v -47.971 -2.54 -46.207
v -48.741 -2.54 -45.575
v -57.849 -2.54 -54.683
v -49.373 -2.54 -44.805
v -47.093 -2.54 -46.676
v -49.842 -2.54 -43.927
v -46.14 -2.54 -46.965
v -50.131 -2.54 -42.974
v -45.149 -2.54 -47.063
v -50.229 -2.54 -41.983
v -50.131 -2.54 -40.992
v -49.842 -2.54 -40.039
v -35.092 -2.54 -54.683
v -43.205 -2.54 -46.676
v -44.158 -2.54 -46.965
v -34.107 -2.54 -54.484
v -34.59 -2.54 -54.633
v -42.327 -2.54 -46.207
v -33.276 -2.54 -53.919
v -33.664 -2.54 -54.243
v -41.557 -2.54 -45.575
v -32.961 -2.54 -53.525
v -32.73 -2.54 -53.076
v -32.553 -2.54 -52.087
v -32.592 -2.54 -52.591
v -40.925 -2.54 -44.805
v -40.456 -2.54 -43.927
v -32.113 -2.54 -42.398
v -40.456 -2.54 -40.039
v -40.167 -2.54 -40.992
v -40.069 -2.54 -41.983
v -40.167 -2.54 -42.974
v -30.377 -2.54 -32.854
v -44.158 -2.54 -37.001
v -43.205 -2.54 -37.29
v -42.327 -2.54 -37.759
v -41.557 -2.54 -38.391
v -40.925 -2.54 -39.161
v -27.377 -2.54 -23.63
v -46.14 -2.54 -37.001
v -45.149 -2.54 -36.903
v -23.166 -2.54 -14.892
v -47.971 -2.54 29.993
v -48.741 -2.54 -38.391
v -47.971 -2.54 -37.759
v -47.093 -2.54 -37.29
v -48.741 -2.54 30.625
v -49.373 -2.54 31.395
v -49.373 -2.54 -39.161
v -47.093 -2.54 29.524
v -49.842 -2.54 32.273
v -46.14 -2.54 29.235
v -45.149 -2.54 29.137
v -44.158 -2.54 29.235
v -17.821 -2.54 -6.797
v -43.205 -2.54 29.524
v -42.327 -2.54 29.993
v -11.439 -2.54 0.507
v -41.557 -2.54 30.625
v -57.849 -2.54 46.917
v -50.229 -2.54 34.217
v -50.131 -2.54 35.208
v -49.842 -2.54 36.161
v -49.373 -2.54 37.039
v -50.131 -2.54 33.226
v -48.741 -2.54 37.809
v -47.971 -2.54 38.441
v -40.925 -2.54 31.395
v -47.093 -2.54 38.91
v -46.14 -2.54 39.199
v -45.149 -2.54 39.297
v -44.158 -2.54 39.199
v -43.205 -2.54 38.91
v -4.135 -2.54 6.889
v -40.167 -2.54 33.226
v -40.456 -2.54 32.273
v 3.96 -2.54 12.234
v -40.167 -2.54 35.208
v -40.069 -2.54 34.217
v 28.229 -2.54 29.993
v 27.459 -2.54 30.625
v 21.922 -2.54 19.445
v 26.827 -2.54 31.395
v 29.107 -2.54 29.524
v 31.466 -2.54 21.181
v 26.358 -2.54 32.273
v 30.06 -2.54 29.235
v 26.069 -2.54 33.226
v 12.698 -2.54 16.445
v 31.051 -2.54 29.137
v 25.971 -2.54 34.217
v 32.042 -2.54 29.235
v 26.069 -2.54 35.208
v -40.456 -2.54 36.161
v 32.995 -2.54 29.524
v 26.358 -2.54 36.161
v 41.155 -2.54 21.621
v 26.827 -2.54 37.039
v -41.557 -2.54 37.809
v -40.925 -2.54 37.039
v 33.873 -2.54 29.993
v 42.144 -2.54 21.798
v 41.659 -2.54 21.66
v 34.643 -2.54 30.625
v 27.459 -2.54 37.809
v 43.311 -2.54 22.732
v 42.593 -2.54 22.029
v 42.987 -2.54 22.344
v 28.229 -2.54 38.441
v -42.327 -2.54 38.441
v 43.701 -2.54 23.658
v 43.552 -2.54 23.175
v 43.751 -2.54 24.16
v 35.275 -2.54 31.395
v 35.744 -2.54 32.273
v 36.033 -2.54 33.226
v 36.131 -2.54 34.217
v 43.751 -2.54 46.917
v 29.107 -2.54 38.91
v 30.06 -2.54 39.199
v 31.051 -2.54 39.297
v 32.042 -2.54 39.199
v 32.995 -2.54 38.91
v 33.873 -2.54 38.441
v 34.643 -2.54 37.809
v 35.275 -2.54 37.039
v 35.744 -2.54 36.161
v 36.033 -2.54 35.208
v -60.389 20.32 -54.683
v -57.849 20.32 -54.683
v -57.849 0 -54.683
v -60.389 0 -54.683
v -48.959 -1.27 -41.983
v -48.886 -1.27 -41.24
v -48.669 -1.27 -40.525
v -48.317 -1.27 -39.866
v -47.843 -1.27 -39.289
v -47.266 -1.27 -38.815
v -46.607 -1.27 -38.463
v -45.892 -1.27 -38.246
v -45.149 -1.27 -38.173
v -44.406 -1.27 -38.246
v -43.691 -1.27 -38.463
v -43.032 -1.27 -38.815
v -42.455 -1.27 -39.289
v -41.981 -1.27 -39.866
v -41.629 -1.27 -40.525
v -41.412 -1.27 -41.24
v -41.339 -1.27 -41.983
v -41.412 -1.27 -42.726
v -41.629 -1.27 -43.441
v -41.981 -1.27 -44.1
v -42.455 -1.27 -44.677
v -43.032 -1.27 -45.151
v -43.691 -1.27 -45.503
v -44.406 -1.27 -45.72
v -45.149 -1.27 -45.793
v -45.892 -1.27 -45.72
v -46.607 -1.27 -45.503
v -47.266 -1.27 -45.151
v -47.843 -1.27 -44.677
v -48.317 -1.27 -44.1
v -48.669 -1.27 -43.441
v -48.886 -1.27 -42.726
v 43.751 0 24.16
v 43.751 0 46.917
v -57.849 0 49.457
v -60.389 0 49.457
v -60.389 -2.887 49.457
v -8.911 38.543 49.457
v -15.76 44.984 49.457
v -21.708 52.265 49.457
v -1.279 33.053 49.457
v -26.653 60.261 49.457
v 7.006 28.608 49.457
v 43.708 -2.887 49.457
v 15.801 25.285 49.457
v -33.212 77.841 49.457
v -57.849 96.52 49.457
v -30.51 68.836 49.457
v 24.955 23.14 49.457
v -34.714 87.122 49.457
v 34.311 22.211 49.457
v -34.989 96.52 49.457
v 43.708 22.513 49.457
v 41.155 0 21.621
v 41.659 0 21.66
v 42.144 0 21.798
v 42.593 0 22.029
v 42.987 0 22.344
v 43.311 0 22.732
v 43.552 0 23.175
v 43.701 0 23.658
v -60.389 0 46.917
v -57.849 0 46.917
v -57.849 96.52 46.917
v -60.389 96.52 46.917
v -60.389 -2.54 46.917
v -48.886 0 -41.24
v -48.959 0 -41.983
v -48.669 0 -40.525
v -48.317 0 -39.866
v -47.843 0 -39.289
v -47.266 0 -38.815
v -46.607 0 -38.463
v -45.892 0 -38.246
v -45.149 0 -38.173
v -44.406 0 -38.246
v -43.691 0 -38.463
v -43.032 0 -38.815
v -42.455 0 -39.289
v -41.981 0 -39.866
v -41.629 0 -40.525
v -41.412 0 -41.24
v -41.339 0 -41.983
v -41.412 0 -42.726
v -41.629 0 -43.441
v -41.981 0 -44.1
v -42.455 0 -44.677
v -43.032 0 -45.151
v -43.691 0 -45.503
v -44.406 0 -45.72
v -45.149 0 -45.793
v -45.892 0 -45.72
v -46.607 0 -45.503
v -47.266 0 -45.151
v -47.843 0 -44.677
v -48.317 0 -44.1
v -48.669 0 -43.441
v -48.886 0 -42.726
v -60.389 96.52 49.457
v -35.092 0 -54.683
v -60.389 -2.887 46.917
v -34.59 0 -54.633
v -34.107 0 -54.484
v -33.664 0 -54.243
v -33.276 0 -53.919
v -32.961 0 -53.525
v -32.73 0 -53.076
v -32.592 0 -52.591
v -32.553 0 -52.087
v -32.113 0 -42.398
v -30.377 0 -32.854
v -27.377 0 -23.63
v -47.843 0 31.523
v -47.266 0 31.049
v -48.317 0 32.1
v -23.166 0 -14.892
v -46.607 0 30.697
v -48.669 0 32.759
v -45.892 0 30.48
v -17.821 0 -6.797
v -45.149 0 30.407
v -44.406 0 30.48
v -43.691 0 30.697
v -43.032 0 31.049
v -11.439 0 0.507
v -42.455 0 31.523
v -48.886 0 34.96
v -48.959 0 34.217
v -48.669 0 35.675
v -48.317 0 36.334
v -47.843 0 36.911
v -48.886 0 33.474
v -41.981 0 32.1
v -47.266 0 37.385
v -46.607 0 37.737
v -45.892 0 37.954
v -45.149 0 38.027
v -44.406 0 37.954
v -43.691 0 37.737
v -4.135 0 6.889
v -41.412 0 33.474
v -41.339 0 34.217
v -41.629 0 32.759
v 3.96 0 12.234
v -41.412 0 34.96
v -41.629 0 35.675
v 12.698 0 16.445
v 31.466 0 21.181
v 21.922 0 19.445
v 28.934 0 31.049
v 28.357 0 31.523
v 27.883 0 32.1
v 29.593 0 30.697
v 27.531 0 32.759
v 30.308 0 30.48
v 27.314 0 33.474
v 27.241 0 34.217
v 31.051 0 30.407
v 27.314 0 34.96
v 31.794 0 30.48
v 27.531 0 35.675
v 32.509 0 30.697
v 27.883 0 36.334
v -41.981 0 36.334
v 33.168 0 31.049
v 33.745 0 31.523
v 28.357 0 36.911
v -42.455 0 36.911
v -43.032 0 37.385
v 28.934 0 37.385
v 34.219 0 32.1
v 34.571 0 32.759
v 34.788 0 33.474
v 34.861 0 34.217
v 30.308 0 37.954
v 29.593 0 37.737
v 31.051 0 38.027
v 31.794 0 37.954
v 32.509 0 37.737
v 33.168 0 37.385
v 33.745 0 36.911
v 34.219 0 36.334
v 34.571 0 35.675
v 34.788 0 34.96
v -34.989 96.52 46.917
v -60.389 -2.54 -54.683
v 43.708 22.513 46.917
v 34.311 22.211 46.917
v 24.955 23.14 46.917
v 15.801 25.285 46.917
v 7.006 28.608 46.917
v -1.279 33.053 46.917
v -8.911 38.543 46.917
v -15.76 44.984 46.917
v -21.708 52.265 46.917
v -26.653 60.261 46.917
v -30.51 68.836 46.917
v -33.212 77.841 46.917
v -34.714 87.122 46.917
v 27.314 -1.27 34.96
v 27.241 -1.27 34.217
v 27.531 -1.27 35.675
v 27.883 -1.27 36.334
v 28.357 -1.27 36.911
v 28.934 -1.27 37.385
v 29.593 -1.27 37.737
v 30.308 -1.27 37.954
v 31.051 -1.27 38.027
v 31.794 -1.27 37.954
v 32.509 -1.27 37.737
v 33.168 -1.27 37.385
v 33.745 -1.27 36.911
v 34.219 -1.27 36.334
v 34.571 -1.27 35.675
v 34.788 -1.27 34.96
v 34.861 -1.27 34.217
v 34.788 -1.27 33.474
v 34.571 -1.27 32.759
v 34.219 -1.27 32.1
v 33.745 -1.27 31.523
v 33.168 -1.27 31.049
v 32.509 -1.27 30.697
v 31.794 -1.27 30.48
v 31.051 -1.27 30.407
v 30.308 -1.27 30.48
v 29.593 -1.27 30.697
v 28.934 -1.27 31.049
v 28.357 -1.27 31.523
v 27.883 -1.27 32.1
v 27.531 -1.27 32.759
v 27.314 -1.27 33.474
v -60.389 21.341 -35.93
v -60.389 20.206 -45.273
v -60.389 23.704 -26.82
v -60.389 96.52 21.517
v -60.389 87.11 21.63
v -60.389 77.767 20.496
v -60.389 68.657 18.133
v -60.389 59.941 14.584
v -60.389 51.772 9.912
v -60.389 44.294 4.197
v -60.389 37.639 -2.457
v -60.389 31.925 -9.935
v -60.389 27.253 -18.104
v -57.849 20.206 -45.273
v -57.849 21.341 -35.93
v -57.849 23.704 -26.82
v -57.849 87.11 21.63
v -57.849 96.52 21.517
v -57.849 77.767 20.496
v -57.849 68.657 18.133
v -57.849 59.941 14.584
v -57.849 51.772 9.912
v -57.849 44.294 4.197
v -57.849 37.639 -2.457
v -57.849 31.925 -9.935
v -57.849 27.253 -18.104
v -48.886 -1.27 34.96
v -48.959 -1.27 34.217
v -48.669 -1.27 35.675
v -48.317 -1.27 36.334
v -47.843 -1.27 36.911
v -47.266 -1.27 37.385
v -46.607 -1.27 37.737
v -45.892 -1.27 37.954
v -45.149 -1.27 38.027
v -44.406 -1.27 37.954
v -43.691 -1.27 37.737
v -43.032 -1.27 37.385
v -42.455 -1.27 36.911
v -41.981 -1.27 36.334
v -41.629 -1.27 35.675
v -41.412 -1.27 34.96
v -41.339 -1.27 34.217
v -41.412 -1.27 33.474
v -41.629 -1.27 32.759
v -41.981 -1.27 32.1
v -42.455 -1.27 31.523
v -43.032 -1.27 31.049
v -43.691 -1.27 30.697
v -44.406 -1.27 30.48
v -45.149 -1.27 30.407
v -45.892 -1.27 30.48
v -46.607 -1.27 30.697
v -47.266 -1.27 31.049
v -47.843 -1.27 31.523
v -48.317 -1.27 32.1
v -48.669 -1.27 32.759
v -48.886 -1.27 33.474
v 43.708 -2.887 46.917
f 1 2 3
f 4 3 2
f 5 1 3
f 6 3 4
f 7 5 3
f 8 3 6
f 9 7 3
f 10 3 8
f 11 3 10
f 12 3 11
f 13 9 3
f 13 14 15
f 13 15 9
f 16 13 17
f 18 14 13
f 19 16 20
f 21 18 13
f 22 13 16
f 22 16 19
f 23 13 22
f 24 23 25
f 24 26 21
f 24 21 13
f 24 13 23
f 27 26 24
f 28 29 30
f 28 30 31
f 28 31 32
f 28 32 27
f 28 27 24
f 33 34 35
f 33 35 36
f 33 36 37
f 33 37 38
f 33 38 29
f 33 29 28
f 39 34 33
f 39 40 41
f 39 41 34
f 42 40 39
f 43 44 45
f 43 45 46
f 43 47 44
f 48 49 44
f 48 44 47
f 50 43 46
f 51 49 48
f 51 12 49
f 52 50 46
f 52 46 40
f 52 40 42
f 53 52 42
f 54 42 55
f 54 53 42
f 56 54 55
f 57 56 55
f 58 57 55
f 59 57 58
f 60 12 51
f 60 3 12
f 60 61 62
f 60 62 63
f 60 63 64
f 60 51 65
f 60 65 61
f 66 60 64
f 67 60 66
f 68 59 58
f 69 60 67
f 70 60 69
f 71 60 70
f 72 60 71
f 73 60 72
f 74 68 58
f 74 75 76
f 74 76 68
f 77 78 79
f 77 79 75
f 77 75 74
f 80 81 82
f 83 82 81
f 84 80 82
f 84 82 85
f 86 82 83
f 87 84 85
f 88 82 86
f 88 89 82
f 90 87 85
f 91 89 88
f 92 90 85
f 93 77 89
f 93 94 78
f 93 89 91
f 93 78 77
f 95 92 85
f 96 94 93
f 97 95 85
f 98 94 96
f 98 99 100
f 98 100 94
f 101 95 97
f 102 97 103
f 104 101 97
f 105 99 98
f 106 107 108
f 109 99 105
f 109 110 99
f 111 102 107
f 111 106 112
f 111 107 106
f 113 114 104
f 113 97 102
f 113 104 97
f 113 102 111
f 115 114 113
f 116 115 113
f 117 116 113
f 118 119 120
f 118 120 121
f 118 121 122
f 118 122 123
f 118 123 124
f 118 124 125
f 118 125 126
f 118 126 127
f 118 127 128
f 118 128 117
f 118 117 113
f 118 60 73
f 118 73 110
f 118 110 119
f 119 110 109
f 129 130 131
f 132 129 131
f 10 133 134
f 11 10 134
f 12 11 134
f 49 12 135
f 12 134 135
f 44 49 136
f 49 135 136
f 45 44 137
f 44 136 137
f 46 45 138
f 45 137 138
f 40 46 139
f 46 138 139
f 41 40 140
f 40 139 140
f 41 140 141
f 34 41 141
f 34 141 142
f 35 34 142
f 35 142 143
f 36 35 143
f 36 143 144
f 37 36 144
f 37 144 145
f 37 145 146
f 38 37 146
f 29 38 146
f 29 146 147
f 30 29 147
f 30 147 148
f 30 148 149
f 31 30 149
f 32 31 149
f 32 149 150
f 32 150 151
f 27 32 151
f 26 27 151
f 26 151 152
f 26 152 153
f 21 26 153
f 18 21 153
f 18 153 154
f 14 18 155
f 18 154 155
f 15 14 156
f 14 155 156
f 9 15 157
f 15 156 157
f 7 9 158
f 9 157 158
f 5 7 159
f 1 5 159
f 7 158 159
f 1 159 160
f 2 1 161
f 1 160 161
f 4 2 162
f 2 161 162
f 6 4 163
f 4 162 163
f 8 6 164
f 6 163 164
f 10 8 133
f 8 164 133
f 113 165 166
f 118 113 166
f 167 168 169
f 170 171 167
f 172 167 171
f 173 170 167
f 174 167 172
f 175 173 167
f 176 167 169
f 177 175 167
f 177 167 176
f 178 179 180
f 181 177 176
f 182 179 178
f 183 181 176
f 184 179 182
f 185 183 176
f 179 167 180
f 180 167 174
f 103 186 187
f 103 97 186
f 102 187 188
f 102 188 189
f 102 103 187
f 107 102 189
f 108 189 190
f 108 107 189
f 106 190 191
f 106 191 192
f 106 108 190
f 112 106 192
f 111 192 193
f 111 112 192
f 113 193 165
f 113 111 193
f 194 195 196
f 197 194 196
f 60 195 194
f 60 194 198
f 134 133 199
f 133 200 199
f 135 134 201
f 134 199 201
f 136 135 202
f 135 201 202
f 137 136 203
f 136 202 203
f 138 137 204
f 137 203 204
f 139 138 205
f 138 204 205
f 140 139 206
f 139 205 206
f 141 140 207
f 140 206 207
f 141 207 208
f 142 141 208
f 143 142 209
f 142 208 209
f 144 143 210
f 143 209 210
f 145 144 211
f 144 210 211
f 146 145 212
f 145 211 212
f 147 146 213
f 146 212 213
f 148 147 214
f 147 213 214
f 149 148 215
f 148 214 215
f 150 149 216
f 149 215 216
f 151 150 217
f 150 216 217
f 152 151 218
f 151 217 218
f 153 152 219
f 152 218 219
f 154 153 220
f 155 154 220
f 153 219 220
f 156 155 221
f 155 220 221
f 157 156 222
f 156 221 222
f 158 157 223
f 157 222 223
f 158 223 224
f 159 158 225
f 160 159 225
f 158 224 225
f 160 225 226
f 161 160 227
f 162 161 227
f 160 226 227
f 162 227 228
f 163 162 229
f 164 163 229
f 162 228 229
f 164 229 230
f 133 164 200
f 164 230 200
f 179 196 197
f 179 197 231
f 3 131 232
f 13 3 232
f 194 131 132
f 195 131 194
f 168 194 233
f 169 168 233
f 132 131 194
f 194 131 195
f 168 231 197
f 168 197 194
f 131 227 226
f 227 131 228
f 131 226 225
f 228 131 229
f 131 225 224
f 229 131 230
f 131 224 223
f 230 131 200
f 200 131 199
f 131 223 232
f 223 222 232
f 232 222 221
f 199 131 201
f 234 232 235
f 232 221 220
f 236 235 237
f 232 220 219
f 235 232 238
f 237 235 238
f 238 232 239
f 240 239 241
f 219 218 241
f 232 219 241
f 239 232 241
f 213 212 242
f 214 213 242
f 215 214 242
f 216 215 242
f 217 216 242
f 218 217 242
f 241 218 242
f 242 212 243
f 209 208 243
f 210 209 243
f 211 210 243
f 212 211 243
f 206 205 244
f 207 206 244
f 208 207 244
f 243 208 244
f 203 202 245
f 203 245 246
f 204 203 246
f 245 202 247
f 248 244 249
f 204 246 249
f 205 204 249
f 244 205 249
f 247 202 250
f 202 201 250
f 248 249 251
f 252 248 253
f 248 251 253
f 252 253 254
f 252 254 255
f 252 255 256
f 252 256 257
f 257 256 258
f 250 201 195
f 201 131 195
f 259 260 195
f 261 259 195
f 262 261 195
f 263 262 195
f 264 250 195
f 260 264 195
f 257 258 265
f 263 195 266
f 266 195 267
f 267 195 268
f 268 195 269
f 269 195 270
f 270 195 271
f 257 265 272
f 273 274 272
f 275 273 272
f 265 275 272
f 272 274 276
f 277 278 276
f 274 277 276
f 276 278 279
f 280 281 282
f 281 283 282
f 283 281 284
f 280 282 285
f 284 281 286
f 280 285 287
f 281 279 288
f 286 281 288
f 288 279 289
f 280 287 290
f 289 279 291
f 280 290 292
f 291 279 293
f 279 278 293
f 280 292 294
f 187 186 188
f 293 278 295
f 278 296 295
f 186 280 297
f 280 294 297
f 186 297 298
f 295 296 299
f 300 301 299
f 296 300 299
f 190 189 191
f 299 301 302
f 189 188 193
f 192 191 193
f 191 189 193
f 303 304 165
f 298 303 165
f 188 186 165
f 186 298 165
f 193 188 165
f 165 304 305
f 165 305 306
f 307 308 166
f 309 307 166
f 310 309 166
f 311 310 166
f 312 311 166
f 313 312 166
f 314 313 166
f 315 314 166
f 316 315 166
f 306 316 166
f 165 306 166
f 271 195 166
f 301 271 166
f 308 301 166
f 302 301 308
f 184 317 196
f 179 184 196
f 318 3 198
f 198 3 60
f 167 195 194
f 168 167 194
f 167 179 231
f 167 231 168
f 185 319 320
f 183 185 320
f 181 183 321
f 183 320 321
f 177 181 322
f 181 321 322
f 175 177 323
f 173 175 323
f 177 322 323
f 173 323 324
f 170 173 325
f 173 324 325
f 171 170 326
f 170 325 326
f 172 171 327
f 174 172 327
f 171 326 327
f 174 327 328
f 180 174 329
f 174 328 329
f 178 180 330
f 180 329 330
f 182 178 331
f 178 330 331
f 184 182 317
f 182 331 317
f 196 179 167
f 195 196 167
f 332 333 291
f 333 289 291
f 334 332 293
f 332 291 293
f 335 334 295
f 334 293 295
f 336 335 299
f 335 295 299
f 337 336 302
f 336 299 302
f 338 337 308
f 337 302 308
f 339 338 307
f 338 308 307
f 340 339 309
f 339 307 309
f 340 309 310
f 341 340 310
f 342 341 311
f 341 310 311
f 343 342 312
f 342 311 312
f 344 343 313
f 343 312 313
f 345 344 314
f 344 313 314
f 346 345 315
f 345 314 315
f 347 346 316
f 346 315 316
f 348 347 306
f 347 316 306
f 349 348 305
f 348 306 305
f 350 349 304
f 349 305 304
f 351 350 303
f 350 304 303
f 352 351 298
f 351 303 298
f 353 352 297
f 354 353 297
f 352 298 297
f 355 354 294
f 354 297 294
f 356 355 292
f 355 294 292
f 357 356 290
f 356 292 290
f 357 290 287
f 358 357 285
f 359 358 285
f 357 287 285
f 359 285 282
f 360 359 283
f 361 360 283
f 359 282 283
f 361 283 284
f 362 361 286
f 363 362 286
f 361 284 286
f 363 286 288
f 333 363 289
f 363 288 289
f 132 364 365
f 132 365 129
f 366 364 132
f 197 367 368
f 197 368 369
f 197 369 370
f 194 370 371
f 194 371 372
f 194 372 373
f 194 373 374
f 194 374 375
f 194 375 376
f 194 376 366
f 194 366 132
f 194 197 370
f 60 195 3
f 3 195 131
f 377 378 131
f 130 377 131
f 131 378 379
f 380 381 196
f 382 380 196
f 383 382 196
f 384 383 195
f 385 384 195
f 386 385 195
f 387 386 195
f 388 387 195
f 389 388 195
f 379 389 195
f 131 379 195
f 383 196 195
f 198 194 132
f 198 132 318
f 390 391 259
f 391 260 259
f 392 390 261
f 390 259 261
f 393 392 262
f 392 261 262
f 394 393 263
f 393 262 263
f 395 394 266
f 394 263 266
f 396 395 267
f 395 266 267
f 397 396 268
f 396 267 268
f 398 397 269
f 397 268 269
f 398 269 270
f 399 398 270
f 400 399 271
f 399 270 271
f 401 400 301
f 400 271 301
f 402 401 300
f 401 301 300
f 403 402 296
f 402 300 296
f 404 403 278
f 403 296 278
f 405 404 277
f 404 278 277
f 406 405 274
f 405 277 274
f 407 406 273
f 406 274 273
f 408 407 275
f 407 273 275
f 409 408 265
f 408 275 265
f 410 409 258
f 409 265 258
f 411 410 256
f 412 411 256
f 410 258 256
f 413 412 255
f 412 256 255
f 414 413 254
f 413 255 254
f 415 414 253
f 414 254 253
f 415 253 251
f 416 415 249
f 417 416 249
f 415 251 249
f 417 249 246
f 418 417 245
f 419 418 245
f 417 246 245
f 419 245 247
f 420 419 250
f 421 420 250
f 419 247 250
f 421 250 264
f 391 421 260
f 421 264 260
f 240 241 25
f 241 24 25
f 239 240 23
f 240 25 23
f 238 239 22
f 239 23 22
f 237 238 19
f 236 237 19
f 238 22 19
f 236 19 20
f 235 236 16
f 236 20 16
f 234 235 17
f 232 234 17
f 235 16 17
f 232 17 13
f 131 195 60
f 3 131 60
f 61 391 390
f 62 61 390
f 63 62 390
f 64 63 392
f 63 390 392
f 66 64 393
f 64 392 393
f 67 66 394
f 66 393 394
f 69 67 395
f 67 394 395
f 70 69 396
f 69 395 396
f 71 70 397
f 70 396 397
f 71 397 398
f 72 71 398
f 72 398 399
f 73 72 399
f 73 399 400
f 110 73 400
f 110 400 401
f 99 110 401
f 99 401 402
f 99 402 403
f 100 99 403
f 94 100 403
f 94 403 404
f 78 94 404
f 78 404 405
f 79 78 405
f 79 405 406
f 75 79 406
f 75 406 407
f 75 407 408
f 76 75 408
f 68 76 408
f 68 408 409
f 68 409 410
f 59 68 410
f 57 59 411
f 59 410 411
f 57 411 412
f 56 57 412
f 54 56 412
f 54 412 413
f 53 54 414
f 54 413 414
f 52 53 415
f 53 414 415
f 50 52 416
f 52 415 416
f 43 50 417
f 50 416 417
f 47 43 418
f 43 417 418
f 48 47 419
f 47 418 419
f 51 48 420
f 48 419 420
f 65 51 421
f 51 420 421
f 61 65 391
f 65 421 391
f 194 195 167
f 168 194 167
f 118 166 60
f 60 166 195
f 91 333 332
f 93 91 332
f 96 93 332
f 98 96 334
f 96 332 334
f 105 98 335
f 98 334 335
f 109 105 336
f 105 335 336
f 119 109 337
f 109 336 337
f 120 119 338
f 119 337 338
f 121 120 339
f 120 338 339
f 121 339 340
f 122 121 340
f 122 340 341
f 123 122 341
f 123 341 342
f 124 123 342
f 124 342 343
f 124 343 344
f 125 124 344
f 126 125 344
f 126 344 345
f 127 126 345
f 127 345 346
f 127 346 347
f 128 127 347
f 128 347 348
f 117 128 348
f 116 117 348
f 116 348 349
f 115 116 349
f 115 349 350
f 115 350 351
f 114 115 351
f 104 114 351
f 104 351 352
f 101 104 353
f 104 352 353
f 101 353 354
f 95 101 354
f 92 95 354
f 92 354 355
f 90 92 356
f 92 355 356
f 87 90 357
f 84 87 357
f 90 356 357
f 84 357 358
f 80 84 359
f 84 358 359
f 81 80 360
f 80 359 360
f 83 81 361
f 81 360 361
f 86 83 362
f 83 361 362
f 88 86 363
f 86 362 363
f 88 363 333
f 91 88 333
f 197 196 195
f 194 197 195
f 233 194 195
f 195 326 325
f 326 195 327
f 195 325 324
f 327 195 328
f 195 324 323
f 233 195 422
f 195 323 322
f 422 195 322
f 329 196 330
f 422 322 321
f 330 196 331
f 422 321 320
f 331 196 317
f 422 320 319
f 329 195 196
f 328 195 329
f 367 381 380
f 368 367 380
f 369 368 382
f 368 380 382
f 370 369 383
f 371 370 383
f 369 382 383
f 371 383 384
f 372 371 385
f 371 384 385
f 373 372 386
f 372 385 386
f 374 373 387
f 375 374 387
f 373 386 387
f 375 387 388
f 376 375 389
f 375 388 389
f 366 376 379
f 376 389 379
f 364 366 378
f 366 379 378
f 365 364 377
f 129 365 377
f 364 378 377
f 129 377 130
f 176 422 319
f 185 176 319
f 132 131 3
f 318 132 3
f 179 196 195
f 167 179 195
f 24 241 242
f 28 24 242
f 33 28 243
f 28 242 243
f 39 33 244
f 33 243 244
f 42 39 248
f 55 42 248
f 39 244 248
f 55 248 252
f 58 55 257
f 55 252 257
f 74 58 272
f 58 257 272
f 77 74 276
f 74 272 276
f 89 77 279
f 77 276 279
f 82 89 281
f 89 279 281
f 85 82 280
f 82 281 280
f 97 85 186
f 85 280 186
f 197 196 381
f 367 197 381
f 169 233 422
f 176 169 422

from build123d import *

# Parameters (mm, degrees)
F1_DEPTH        = 2.54
F2_R            = 2.54
F3_R            = 2.54
F5_DEPTH        = 2.54
F1_FACE_W       = 2.54
F1_FACE_H       = 101.6
F6_DEPTH        = 2.54
F8_DEPTH        = 2.54
F8_FACE_W       = 96.52
F8_FACE_H       = 2.54
F9_DEPTH        = 2.54
F11_D           = 7.62
F11_DEPTH       = 25.4
F11_CSINK_D     = 10.16
F11_CSINK_ANGLE = 90


with BuildPart() as f1:
    # F0 (on Front) → F1 (new body)
    with BuildSketch(Plane.XZ):
        with BuildLine():
            Line((43.751044, 46.916903), (-57.848956, 46.916903))
            Line((-57.848956, 46.916903), (-57.848956, -54.683097))
            Line((-57.848956, -54.683097), (-32.448956, -54.683097))
            ThreePointArc((-32.448956, -54.683097), (-11.439245, 0.507192), (43.751044, 21.516903))
            Line((43.751044, 21.516903), (43.751044, 46.916903))
        make_face()
    extrude(amount=F1_DEPTH)

    # F2
    f2_edges = [f1.edges().sort_by_distance(p)[0] for p in [
        (43.751044, -1.27, 21.516903),
    ]]
    fillet(f2_edges, radius=F2_R)

    # F3
    f3_edges = [f1.edges().sort_by_distance(p)[0] for p in [
        (-32.448956, -1.27, -54.683097),
    ]]
    fillet(f3_edges, radius=F3_R)

    # F11
    with Locations(Plane.XZ.offset(2.54)):
        with Locations((-45.148956, 34.216903), (31.051044, 34.216903), (-45.148956, -41.983097)):
            CounterSinkHole(F11_D / 2, F11_CSINK_D / 2, depth=F11_DEPTH, counter_sink_angle=F11_CSINK_ANGLE)


with BuildPart() as f5:
    # F4 (on face) → F5 (new body)
    with BuildSketch(Plane(origin=(-57.848956, 0, 0), x_dir=(0, -1, 0), z_dir=(-1, 0, 0))):
        with BuildLine():
            Line((0, -54.683097), (0, 46.916903))
            Line((0, 46.916903), (-96.52, 46.916903))
            Line((-96.52, 46.916903), (-96.52, 21.516903))
            ThreePointArc((-96.52, 21.516903), (-40.856178, 0.980725), (-20.32, -54.683097))
            Line((-20.32, -54.683097), (0, -54.683097))
        make_face()
    extrude(amount=F5_DEPTH)


with BuildPart() as f6:
    # F1_face (on face) → F6 (new body)
    with BuildSketch(Plane(origin=(-57.848956, -1.27, -3.883097), x_dir=(0, -1, 0), z_dir=(-1, 0, 0))):
        Rectangle(F1_FACE_W, F1_FACE_H)
    extrude(amount=F6_DEPTH)


with BuildPart() as f8:
    # F7 (on face) → F8 (new body)
    with BuildSketch(Plane.XY.offset(46.916903)):
        with BuildLine():
            Line((-57.848956, 0), (-60.388956, 0))
            Line((-60.388956, 0), (-60.388956, -2.887196))
            Line((-60.388956, -2.887196), (43.708101, -2.887196))
            Line((43.708101, -2.887196), (43.708101, 22.512804))
            ThreePointArc((43.708101, 22.512804), (-12.441212, 41.650947), (-34.988956, 96.52))
            Line((-34.988956, 96.52), (-57.848956, 96.52))
            Line((-57.848956, 96.52), (-57.848956, 0))
        make_face()
    extrude(amount=F8_DEPTH)


with BuildPart() as f9:
    # F8_face (on face) → F9 (new body)
    with BuildSketch(Plane(origin=(-57.848956, 48.26, 48.186903), x_dir=(0, -1, 0), z_dir=(-1, 0, 0))):
        Rectangle(F8_FACE_W, F8_FACE_H)
    extrude(amount=F9_DEPTH)


solid = Compound([f1.part, f5.part, f6.part, f8.part, f9.part])
